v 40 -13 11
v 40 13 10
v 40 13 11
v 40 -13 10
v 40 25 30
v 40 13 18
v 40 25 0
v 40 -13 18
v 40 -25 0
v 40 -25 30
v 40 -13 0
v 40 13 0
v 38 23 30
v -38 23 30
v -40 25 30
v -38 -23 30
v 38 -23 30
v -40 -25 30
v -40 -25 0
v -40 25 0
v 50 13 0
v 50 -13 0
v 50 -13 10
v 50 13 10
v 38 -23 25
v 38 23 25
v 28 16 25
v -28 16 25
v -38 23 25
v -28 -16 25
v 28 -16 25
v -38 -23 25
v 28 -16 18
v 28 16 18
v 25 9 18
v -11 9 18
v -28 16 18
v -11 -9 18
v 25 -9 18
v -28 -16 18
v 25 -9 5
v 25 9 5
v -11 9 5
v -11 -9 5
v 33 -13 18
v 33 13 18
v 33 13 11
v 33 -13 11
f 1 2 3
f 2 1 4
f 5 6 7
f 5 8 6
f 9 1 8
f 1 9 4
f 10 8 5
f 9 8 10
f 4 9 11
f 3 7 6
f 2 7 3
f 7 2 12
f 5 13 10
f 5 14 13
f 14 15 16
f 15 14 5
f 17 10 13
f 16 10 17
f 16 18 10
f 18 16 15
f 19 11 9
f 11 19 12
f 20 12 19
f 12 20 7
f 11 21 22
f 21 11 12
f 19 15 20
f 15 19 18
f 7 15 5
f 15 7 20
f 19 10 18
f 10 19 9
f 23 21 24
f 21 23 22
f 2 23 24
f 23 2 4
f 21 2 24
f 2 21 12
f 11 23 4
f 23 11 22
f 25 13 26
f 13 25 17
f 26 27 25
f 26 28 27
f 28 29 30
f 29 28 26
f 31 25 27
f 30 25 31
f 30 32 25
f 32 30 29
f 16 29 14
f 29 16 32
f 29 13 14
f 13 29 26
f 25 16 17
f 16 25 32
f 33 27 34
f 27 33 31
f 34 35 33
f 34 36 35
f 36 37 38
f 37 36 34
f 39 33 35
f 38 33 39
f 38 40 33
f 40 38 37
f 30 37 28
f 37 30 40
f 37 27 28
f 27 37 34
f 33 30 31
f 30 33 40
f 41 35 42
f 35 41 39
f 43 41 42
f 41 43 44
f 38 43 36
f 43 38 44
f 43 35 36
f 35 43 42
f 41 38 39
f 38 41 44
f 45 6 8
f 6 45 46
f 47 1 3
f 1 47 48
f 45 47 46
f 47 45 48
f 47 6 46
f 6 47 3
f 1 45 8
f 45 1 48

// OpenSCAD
// All dimensions are in millimeters
$fn = 64;
eps = 0.01;

// Main body dimensions
body_length = 80;
body_width = 50;
body_height = 30;

// Top stepped cavity parameters
rim_width = 2;
floor_thickness = 5;

// Broad upper recess, leaving a thin top rim
upper_recess_length = body_length - 2 * rim_width;
upper_recess_width = body_width - 2 * rim_width;
upper_recess_depth = 5;

// Second stepped recess
second_recess_length = 56;
second_recess_width = 32;
second_recess_depth = 12;

// Deepest shifted pocket
deep_pocket_length = 36;
deep_pocket_width = 18;
deep_pocket_shift_x = 7;
deep_pocket_depth = body_height - floor_thickness;

// Side projection parameters
projection_length = 10;
projection_width = 26;
projection_height = 10;

// Side recess above the projection
side_recess_depth = 7;
side_recess_width = projection_width;
side_recess_height = 7;
side_recess_z = projection_height + 1;

// Main rectangular body
module body_blank() {
    translate([-body_length / 2, -body_width / 2, 0])
        cube([body_length, body_width, body_height]);
}

// Added rectangular projection on the +X side
module projection_tab() {
    translate([body_length / 2 - eps, -projection_width / 2, 0])
        cube([projection_length + eps, projection_width, projection_height]);
}

// Rectangular pocket cut downward from the top face
module top_rect_pocket(l, w, d, x = 0, y = 0) {
    translate([x - l / 2, y - w / 2, body_height - d])
        cube([l, w, d + eps]);
}

// Recess cut into the +X side above the projection
module side_recess_cut() {
    translate([body_length / 2 - side_recess_depth, -side_recess_width / 2, side_recess_z])
        cube([side_recess_depth + eps, side_recess_width, side_recess_height]);
}

// Final model
difference() {
    // Combine body and side projection
    union() {
        body_blank();
        projection_tab();
    }

    // Step 1: broad upper recess surrounded by thin rim
    top_rect_pocket(upper_recess_length, upper_recess_width, upper_recess_depth);

    // Step 2: smaller centered recess below the upper recess
    top_rect_pocket(second_recess_length, second_recess_width, second_recess_depth);

    // Step 3: deepest pocket, shifted to one side, solid floor remains
    top_rect_pocket(deep_pocket_length, deep_pocket_width, deep_pocket_depth, deep_pocket_shift_x, 0);

    // Step 4: side recess above the projection
    side_recess_cut();
}
